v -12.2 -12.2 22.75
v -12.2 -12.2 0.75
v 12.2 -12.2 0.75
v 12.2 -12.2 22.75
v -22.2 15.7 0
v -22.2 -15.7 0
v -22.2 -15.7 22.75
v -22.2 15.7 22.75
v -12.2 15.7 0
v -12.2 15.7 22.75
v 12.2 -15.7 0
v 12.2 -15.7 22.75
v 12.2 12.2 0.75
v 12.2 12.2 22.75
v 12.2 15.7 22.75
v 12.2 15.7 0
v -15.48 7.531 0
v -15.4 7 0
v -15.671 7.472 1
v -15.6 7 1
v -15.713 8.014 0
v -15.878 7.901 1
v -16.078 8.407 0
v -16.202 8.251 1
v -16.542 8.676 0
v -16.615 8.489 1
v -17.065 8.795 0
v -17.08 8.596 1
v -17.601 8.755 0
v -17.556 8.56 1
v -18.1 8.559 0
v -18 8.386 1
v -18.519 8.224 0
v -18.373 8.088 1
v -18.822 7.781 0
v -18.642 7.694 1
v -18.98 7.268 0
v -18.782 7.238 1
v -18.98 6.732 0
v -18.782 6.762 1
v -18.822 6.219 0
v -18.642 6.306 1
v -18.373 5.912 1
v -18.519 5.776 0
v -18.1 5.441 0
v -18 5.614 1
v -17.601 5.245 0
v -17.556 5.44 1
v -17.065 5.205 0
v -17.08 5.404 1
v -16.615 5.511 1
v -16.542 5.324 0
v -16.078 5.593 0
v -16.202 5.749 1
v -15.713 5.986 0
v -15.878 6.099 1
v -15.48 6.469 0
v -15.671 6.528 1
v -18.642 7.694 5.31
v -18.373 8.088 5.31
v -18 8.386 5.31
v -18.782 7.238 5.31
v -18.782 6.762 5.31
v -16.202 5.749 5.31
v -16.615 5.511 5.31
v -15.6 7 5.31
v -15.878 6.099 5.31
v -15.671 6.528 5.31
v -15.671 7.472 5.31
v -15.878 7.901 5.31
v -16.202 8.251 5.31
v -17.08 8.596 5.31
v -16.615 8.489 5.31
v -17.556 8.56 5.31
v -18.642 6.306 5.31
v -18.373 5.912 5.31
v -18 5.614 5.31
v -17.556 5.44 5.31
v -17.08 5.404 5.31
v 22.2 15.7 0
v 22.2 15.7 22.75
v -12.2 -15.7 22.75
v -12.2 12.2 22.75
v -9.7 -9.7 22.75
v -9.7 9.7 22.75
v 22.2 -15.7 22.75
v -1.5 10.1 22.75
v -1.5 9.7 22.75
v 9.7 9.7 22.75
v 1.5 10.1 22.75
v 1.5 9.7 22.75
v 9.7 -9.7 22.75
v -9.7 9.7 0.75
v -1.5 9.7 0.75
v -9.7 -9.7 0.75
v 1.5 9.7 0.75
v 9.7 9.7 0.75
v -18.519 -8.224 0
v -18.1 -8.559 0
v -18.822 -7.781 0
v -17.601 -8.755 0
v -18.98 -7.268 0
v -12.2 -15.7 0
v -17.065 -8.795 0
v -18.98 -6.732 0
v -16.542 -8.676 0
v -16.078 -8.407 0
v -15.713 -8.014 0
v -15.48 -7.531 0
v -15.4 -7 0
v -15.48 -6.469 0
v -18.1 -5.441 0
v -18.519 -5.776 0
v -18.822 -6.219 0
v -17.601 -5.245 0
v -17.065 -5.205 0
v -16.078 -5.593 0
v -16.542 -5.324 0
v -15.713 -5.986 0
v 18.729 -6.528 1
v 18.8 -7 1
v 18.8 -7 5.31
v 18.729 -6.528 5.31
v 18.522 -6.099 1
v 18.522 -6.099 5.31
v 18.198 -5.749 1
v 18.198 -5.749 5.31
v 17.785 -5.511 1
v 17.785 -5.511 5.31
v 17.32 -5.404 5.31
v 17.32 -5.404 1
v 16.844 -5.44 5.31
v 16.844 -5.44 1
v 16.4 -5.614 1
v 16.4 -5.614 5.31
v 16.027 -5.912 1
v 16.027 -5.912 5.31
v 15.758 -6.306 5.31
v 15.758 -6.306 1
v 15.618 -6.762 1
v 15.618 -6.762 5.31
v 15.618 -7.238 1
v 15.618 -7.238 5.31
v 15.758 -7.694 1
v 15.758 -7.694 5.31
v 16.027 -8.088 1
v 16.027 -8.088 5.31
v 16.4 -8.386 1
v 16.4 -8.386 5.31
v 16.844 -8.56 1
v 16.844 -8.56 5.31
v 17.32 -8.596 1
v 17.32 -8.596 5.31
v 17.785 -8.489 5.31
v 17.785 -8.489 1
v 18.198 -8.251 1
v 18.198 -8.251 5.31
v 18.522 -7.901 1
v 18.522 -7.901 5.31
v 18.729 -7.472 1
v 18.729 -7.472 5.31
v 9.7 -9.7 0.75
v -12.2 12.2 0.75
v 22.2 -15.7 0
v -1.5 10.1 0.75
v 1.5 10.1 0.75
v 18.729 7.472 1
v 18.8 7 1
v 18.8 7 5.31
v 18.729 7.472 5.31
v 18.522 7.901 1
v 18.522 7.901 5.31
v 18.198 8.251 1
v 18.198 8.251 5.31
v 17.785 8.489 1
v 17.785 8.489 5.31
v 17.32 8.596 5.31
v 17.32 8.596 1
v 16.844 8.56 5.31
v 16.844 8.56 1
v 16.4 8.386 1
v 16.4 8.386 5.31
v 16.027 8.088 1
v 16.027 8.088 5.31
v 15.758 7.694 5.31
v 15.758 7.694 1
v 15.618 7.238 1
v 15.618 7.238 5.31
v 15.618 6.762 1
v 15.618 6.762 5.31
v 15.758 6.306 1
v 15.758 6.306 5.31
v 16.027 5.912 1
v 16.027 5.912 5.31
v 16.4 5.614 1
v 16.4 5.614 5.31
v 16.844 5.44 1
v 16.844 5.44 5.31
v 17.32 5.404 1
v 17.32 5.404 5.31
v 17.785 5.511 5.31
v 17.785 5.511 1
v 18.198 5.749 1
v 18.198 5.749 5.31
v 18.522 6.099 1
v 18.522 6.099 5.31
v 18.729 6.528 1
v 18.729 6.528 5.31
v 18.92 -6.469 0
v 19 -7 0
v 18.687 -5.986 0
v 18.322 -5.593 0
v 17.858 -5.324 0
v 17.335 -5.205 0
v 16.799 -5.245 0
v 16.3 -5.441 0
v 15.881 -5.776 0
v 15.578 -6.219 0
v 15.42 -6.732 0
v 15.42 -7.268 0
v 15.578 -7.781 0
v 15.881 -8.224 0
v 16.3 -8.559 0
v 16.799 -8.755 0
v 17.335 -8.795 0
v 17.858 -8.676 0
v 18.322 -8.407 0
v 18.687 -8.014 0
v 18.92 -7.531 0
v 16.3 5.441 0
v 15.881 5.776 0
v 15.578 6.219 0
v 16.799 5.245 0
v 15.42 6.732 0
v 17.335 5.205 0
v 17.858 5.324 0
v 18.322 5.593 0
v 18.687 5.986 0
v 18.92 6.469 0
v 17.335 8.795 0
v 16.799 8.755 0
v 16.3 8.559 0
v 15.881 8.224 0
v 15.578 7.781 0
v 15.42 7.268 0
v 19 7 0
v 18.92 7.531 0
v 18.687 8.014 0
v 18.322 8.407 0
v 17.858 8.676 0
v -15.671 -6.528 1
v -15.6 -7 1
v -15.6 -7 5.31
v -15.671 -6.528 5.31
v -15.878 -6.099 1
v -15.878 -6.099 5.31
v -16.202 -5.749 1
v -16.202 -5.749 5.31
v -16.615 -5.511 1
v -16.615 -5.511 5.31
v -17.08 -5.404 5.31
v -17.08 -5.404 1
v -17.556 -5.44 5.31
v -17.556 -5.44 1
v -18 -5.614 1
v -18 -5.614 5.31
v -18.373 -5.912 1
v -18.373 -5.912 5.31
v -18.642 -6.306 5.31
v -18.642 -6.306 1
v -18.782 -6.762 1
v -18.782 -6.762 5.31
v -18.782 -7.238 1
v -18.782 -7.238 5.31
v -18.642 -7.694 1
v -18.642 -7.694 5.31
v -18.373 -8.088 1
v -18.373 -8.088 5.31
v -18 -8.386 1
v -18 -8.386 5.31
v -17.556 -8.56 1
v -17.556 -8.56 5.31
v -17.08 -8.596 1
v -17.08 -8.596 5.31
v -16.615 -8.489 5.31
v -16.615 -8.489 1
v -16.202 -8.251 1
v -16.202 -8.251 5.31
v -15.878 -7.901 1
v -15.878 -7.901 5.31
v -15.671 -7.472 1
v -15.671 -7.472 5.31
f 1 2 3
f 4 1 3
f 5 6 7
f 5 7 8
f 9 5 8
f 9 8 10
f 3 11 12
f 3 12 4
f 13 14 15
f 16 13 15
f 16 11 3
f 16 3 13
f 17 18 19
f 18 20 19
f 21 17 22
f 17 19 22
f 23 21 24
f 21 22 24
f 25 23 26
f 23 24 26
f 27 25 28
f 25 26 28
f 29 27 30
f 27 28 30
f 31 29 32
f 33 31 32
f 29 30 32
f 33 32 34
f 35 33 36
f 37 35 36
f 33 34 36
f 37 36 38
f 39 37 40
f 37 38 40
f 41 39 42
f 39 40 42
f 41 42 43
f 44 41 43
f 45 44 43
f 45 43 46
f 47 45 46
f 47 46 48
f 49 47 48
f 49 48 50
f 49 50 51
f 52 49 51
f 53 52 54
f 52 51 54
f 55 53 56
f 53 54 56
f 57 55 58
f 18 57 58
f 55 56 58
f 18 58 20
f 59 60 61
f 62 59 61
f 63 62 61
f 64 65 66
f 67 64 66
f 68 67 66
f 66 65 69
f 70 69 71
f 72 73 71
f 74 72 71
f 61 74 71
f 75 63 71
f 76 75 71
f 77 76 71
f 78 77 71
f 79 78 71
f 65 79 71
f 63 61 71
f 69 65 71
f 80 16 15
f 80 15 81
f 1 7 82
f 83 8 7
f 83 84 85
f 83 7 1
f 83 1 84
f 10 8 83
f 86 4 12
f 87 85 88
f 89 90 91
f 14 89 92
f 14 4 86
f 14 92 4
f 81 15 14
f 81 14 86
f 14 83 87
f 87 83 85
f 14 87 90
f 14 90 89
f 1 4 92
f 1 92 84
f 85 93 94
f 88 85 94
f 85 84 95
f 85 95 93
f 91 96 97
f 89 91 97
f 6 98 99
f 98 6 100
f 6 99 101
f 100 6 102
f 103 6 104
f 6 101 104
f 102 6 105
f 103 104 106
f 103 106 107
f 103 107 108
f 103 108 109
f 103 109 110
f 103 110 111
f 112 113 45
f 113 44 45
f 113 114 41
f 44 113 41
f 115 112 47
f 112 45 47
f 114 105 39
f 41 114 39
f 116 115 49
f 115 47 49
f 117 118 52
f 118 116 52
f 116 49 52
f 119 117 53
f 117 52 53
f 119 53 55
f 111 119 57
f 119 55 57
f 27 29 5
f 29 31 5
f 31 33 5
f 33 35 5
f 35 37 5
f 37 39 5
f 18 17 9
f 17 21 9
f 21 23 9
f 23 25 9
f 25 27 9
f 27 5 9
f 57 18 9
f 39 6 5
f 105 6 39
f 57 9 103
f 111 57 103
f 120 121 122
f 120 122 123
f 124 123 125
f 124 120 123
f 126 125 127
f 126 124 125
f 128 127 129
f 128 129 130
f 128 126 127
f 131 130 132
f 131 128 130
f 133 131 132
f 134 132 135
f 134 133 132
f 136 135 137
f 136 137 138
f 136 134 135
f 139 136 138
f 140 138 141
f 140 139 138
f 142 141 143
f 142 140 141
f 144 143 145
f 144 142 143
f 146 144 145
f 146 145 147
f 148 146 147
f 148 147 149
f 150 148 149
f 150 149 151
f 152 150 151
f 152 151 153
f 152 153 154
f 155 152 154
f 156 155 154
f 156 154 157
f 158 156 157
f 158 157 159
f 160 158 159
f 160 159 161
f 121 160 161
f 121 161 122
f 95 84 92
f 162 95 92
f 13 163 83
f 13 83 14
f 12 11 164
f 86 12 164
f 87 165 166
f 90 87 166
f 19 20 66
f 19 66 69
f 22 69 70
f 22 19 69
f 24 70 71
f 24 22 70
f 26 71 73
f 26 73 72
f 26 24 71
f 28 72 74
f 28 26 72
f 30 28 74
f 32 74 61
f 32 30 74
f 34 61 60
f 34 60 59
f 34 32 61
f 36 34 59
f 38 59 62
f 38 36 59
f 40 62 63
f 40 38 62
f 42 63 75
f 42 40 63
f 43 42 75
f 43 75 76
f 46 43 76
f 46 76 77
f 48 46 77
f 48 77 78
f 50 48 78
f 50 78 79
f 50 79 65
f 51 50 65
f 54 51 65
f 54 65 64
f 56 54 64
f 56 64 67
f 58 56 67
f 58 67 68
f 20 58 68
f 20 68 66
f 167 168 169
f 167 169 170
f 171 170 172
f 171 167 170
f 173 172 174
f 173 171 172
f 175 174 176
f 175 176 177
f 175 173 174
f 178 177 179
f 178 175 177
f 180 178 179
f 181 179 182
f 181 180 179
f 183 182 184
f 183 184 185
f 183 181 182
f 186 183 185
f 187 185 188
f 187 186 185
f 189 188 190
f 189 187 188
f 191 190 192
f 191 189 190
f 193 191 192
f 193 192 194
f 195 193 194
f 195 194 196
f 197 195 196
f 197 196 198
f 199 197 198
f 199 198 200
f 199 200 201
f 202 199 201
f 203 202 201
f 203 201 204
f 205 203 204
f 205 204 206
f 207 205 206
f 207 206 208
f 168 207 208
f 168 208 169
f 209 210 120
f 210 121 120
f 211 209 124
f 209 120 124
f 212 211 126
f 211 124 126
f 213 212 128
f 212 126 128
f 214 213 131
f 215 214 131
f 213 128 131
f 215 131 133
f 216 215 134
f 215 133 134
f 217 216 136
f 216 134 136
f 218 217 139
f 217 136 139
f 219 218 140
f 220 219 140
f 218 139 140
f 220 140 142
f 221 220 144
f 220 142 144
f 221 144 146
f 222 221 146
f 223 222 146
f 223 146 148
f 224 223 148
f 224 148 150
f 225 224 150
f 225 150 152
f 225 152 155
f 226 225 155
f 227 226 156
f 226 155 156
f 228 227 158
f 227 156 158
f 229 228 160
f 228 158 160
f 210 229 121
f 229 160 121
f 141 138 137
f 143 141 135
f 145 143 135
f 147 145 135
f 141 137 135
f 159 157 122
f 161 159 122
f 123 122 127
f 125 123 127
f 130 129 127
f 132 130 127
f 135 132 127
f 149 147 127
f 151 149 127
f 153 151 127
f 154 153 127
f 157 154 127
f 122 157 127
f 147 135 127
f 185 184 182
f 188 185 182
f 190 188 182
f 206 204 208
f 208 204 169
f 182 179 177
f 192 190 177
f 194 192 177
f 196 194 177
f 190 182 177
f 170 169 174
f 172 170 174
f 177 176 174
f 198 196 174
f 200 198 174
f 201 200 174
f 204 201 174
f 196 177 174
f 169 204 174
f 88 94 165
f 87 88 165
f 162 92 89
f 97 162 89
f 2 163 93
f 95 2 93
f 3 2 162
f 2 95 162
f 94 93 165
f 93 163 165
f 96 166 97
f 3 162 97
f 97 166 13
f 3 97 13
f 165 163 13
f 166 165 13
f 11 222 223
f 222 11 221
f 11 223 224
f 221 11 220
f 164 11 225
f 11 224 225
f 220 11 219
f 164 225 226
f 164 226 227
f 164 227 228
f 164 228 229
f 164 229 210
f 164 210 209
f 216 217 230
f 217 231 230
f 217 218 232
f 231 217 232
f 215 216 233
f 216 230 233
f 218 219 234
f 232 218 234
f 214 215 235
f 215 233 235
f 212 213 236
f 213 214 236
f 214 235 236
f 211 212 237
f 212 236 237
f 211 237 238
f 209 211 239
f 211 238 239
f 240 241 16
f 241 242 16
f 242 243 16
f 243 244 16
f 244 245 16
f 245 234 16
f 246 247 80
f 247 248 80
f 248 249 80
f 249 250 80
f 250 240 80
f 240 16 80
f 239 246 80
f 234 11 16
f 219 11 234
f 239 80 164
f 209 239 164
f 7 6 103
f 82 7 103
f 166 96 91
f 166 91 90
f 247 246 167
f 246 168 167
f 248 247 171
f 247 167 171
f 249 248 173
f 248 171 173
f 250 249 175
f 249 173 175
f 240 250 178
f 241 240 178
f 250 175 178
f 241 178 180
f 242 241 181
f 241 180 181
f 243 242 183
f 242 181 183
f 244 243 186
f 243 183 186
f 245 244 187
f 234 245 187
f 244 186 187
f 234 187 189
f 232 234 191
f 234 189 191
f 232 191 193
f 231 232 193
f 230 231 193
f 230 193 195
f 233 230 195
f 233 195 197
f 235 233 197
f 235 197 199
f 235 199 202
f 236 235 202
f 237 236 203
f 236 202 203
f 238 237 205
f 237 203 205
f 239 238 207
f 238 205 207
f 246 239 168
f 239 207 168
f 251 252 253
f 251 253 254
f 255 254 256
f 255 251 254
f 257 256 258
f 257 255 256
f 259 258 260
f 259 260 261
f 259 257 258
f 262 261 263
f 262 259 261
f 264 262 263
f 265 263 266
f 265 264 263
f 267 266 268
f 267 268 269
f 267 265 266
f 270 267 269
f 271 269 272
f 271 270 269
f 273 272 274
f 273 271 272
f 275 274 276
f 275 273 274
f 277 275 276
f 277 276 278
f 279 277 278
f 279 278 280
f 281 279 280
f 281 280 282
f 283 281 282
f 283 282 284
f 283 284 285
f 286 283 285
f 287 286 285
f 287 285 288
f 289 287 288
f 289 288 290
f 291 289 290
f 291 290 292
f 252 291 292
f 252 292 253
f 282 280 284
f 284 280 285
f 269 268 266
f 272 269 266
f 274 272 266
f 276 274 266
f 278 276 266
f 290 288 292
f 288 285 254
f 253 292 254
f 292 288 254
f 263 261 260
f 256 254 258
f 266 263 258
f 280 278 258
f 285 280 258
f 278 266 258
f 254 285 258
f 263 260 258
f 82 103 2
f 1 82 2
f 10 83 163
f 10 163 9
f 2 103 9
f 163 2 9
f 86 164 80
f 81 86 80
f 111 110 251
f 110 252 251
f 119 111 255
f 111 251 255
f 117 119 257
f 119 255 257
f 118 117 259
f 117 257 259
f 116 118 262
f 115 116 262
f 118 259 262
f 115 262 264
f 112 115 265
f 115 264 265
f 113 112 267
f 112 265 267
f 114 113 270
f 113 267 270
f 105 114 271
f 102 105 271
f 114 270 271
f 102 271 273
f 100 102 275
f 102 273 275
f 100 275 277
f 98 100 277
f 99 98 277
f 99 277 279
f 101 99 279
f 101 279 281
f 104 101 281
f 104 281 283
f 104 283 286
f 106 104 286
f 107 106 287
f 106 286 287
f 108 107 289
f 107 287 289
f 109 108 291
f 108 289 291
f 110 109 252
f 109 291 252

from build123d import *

# Parameters (mm, degrees)
CYLINDER010_R     = 1.6
CYLINDER010_DEPTH = 5.32
CYLINDER008_R     = 1.6
CYLINDER008_DEPTH = 5.32
CYLINDER007_R     = 3.6
CYLINDER007_DEPTH = 6
CYLINDER006_R     = 3.6
CYLINDER006_DEPTH = 6
CUBE004_W         = 10
CUBE004_H         = 31.4
CUBE004_DEPTH     = 22.75
CYLINDER004_R     = 1.6
CYLINDER004_DEPTH = 5.32
CYLINDER002_R     = 1.6
CYLINDER002_DEPTH = 5.32
CYLINDER001_R     = 3.6
CYLINDER001_DEPTH = 6
CYLINDER_R        = 3.6
CYLINDER_DEPTH    = 6
CUBE003_W         = 10
CUBE003_H         = 31.4
CUBE003_DEPTH     = 22.75
CUBE002_W         = 3
CUBE002_H         = 0.4
CUBE002_DEPTH     = 23
CUBE001_W         = 19.4
CUBE001_H         = 19.4
CUBE001_DEPTH     = 23
CUBE_W            = 24.4
CUBE_H            = 24.4
CUBE_DEPTH        = 22


with BuildPart() as cylinder011:
    # cylinder011 → cylinder011 (revolve)
    with BuildSketch(Plane.XZ):
        Polygon((0, 0), (1.8, 0), (1.6, 1), (0, 1), align=None)
    revolve(axis=Axis((0, 0, 0), (0, 0, 1)))


with BuildPart() as union006:
    # cylinder010 → cylinder010 (new body)
    with BuildSketch(Plane.XY.offset(-0.01)):
        Circle(CYLINDER010_R)
    extrude(amount=CYLINDER010_DEPTH)

    # union006: union cylinder011
    add(cylinder011.part)


with BuildPart() as union006_1:
    # union006 placement: moved
    add(union006.part.moved(Location((17.2, 7, 0))))


with BuildPart() as cylinder009:
    # cylinder009 → cylinder009 (revolve)
    with BuildSketch(Plane.XZ):
        Polygon((0, 0), (1.8, 0), (1.6, 1), (0, 1), align=None)
    revolve(axis=Axis((0, 0, 0), (0, 0, 1)))


with BuildPart() as group003:
    # cylinder008 → cylinder008 (new body)
    with BuildSketch(Plane.XY.offset(-0.01)):
        Circle(CYLINDER008_R)
    extrude(amount=CYLINDER008_DEPTH)

    # union005: union cylinder009
    add(cylinder009.part)


with BuildPart() as group003_1:
    # union005 placement: moved
    add(group003.part.moved(Location((17.2, -7, 0))))

    # Group003: union union006
    add(union006_1.part)


with BuildPart() as cylinder007:
    # cylinder007 → cylinder007 (new body)
    with BuildSketch(Plane(origin=(17.2, 7, 0), x_dir=(1, 0, 0), z_dir=(0, 0, 1))):
        Circle(CYLINDER007_R)
    extrude(amount=CYLINDER007_DEPTH)


with BuildPart() as group002:
    # cylinder006 → cylinder006 (new body)
    with BuildSketch(Plane(origin=(17.2, -7, 0), x_dir=(1, 0, 0), z_dir=(0, 0, 1))):
        Circle(CYLINDER006_R)
    extrude(amount=CYLINDER006_DEPTH)

    # Group002: union cylinder007
    add(cylinder007.part)


with BuildPart() as difference002:
    # cube004 → cube004 (new body)
    with BuildSketch(Plane(origin=(12.2, -15.7, 0), x_dir=(1, 0, 0), z_dir=(0, 0, 1))):
        with Locations((5, 15.7)):
            Rectangle(CUBE004_W, CUBE004_H)
    extrude(amount=CUBE004_DEPTH)

    # union004: union Group002
    add(group002.part)

    # difference002: cut Group003
    add(group003_1.part, mode=Mode.SUBTRACT)


with BuildPart() as cylinder005:
    # cylinder005 → cylinder005 (revolve)
    with BuildSketch(Plane.XZ):
        Polygon((0, 0), (1.8, 0), (1.6, 1), (0, 1), align=None)
    revolve(axis=Axis((0, 0, 0), (0, 0, 1)))


with BuildPart() as union003:
    # cylinder004 → cylinder004 (new body)
    with BuildSketch(Plane.XY.offset(-0.01)):
        Circle(CYLINDER004_R)
    extrude(amount=CYLINDER004_DEPTH)

    # union003: union cylinder005
    add(cylinder005.part)


with BuildPart() as union003_1:
    # union003 placement: moved
    add(union003.part.moved(Location((-17.2, 7, 0))))


with BuildPart() as cylinder003:
    # cylinder003 → cylinder003 (revolve)
    with BuildSketch(Plane.XZ):
        Polygon((0, 0), (1.8, 0), (1.6, 1), (0, 1), align=None)
    revolve(axis=Axis((0, 0, 0), (0, 0, 1)))


with BuildPart() as group001:
    # cylinder002 → cylinder002 (new body)
    with BuildSketch(Plane.XY.offset(-0.01)):
        Circle(CYLINDER002_R)
    extrude(amount=CYLINDER002_DEPTH)

    # union002: union cylinder003
    add(cylinder003.part)


with BuildPart() as group001_1:
    # union002 placement: moved
    add(group001.part.moved(Location((-17.2, -7, 0))))

    # Group001: union union003
    add(union003_1.part)


with BuildPart() as cylinder001:
    # cylinder001 → cylinder001 (new body)
    with BuildSketch(Plane(origin=(-17.2, 7, 0), x_dir=(1, 0, 0), z_dir=(0, 0, 1))):
        Circle(CYLINDER001_R)
    extrude(amount=CYLINDER001_DEPTH)


with BuildPart() as group:
    # cylinder → cylinder (new body)
    with BuildSketch(Plane(origin=(-17.2, -7, 0), x_dir=(1, 0, 0), z_dir=(0, 0, 1))):
        Circle(CYLINDER_R)
    extrude(amount=CYLINDER_DEPTH)

    # Group: union cylinder001
    add(cylinder001.part)


with BuildPart() as group004:
    # cube003 → cube003 (new body)
    with BuildSketch(Plane(origin=(-22.2, -15.7, 0), x_dir=(1, 0, 0), z_dir=(0, 0, 1))):
        with Locations((5, 15.7)):
            Rectangle(CUBE003_W, CUBE003_H)
    extrude(amount=CUBE003_DEPTH)

    # union001: union Group
    add(group.part)

    # difference001: cut Group001
    add(group001_1.part, mode=Mode.SUBTRACT)

    # Group004: union difference002
    add(difference002.part)


with BuildPart() as cube002:
    # cube002 → cube002 (new body)
    with BuildSketch(Plane(origin=(-1.5, 9.7, -11.5), x_dir=(1, 0, 0), z_dir=(0, 0, 1))):
        with Locations((1.5, 0.2)):
            Rectangle(CUBE002_W, CUBE002_H)
    extrude(amount=CUBE002_DEPTH)


with BuildPart() as union:
    # cube001 → cube001 (new body)
    with BuildSketch(Plane(origin=(-9.7, -9.7, -11.5), x_dir=(1, 0, 0), z_dir=(0, 0, 1))):
        with Locations((9.7, 9.7)):
            Rectangle(CUBE001_W, CUBE001_H)
    extrude(amount=CUBE001_DEPTH)

    # union: union cube002
    add(cube002.part)


with BuildPart() as union007:
    # cube → cube (new body)
    with BuildSketch(Plane(origin=(-12.2, -12.2, -11), x_dir=(1, 0, 0), z_dir=(0, 0, 1))):
        with Locations((12.2, 12.2)):
            Rectangle(CUBE_W, CUBE_H)
    extrude(amount=CUBE_DEPTH)

    # difference: cut union
    add(union.part, mode=Mode.SUBTRACT)


with BuildPart() as union007_1:
    # difference placement: moved
    add(union007.part.moved(Location((0, 0, 11.75))))

    # union007: union Group004
    add(group004.part)


solid = union007_1.part
